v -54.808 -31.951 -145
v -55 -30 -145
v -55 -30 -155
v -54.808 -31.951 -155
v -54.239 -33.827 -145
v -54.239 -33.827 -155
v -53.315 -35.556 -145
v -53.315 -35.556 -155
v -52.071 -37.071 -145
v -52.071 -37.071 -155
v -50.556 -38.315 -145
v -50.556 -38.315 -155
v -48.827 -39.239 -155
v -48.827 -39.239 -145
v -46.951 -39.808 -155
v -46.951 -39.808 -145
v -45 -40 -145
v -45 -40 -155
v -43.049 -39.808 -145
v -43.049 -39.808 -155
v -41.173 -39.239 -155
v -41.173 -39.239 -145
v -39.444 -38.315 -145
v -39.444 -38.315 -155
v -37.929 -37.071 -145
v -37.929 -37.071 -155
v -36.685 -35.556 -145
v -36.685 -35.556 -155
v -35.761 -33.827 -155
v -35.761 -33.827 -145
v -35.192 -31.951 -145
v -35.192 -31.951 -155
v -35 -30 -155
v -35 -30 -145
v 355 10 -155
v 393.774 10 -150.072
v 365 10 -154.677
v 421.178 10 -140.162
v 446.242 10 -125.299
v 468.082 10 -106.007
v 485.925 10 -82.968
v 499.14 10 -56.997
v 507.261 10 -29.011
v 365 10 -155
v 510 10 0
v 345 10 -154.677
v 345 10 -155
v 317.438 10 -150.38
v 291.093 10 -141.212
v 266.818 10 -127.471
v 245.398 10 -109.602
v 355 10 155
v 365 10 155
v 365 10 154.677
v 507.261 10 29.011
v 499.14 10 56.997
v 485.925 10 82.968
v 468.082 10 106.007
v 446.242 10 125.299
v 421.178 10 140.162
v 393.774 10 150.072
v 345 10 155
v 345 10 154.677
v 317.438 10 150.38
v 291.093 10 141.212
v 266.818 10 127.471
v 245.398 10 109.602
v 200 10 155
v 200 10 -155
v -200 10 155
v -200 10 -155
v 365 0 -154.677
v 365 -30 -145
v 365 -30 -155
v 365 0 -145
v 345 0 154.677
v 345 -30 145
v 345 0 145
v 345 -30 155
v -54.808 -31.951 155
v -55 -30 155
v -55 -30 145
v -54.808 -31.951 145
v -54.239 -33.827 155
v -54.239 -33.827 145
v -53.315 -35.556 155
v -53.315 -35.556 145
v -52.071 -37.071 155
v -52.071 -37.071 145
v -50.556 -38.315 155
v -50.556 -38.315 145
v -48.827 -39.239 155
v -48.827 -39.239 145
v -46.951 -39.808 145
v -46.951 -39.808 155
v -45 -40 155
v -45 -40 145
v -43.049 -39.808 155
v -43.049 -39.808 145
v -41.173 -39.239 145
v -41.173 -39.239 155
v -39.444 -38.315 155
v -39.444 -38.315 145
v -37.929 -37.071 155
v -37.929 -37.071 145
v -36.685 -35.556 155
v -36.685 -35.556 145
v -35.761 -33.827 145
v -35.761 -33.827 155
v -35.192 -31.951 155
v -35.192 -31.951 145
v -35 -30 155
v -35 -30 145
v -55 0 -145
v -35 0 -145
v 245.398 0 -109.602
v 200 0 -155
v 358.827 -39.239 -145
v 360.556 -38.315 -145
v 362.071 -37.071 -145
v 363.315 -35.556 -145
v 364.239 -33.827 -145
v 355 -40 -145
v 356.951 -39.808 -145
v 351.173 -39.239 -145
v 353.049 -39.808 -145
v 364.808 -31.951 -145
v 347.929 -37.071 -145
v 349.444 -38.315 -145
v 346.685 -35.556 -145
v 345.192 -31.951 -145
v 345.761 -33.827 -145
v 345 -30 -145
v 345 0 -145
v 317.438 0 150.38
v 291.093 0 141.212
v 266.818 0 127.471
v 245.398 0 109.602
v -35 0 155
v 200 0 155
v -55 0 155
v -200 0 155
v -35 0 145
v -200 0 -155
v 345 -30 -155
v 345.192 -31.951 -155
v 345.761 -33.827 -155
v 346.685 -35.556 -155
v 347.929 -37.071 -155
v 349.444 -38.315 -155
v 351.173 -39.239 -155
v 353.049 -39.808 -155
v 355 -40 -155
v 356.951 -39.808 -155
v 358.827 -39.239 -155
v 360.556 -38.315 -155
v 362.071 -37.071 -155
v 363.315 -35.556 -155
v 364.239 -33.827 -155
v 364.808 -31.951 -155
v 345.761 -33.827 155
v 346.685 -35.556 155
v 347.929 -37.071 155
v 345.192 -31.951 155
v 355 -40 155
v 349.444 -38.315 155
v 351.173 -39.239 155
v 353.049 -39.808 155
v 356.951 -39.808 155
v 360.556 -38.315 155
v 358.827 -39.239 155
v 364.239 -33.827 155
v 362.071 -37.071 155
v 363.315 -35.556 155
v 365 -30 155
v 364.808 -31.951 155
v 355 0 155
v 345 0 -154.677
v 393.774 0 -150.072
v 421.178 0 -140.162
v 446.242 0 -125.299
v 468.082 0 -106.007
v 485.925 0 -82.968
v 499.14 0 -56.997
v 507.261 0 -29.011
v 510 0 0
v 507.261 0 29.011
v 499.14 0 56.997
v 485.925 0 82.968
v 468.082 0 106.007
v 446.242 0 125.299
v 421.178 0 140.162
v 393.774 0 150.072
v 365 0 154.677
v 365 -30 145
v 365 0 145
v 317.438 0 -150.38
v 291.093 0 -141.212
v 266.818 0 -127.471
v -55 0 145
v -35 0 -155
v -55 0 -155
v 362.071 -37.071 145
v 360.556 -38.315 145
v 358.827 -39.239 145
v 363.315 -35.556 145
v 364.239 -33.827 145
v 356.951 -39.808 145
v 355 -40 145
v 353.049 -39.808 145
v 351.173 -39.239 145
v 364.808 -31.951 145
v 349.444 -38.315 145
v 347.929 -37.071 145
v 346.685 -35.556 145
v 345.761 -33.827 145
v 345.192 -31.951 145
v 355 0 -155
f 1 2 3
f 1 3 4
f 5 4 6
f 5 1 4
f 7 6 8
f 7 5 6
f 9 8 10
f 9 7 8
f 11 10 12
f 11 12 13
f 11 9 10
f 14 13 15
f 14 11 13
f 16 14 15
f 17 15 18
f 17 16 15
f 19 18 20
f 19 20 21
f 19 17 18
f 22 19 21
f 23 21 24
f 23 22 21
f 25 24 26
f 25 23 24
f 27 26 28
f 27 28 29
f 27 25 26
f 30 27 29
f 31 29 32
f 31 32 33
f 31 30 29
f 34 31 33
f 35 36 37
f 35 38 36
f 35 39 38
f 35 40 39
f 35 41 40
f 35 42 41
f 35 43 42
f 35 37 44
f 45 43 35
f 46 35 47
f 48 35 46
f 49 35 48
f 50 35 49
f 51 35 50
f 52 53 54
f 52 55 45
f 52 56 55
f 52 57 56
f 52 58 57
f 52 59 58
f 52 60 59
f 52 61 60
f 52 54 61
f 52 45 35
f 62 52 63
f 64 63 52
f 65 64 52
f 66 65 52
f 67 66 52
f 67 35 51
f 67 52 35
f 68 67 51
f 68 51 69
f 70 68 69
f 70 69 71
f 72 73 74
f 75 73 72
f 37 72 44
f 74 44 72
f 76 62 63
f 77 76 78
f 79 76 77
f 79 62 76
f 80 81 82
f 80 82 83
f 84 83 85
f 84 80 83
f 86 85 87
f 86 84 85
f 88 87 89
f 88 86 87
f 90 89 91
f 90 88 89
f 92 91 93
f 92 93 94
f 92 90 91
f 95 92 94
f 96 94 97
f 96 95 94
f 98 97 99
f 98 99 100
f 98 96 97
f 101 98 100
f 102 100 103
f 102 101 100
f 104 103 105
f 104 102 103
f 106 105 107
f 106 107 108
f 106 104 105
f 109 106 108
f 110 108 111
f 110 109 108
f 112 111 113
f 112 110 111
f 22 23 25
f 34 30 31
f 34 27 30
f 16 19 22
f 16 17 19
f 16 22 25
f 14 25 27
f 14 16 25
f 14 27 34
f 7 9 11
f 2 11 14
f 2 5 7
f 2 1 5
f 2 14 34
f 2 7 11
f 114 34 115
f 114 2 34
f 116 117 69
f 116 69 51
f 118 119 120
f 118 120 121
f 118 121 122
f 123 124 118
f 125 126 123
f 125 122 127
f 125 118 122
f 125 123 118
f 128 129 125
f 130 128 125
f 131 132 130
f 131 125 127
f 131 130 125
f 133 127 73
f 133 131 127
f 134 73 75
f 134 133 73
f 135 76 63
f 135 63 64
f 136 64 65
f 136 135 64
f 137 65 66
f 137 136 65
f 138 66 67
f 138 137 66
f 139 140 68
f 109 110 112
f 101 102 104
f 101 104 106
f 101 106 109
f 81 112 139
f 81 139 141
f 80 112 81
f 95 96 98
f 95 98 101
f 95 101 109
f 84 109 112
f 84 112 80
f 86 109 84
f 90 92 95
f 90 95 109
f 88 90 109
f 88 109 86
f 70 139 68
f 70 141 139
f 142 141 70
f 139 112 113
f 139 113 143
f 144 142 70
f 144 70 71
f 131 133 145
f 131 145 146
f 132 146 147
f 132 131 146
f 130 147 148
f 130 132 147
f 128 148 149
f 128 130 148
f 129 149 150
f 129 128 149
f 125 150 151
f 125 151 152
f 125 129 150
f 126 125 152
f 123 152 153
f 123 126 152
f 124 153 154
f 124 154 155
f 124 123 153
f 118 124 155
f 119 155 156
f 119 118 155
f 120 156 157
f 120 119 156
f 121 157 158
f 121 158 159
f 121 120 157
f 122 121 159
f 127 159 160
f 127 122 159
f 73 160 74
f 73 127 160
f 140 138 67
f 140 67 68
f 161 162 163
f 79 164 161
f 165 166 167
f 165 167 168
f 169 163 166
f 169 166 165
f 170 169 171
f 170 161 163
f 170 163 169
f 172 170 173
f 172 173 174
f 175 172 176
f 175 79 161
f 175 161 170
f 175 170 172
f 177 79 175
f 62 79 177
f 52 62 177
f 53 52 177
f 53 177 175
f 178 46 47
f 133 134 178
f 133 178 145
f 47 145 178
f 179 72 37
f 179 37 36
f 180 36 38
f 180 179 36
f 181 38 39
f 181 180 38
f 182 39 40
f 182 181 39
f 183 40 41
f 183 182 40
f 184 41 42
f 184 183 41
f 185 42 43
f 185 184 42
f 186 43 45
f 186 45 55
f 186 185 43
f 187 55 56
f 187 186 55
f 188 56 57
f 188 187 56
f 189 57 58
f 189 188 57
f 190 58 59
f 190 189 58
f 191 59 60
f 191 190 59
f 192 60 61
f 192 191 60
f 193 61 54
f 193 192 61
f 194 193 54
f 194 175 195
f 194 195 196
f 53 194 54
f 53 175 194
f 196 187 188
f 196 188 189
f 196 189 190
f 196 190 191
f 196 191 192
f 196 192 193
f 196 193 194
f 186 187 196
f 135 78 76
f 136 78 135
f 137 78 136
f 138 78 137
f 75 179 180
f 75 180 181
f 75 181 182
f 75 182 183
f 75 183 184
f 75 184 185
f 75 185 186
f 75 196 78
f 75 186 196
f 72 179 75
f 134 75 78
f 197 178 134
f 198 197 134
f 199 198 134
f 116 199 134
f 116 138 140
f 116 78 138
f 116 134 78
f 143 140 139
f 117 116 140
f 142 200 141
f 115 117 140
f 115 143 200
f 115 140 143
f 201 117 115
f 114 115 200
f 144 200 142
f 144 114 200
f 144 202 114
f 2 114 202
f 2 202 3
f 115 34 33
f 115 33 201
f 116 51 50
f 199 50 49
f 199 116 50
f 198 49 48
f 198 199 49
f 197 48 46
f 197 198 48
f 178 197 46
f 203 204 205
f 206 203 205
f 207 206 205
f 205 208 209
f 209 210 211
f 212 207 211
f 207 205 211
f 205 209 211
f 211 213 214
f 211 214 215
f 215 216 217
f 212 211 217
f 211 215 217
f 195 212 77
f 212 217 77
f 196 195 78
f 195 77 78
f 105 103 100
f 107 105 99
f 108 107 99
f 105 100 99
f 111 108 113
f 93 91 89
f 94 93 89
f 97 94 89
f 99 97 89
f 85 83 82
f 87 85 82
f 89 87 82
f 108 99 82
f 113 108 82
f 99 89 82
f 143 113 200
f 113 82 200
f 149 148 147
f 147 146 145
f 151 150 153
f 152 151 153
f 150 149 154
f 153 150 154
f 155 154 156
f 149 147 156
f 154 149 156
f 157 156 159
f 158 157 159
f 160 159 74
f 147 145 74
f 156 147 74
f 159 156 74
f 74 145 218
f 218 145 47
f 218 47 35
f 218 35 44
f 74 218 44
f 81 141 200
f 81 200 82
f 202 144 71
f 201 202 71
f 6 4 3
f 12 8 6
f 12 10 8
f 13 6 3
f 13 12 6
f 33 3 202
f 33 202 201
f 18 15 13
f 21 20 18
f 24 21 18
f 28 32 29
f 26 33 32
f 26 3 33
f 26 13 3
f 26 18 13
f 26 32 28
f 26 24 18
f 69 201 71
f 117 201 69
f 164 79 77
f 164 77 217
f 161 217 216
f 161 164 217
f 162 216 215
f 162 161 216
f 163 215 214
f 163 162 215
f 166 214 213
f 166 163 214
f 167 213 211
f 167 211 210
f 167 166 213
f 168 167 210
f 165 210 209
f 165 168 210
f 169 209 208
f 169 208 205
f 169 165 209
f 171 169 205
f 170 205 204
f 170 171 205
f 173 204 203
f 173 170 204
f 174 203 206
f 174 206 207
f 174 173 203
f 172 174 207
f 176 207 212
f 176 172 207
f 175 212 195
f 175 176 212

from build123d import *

# Parameters (mm, degrees)
BOSS_EXTRUDE2_DEPTH = 10
BOSS_EXTRUDE3_DEPTH = 310
SKETCH7_W           = 290
SKETCH7_H           = 40
CUT_EXTRUDE1_DEPTH  = 589


with BuildPart() as part:
    # Sketch2 → Boss-Extrude2 (new body)
    with BuildSketch(Plane(origin=(0, 0, 0), x_dir=(1, 0, 0), z_dir=(0, 1, 0))):
        with BuildLine():
            Line((200, 155), (245.398448916, 109.601551084))
            ThreePointArc((245.398448916, 109.601551084), (510, 0), (245.398448916, -109.601551084))
            Line((245.398448916, -109.601551084), (200, -155))
            Line((200, -155), (-200, -155))
            Line((-200, -155), (-200, 155))
            Line((-200, 155), (200, 155))
        make_face()
    extrude(amount=BOSS_EXTRUDE2_DEPTH)

    # Sketch6 → Boss-Extrude3 (add)
    with BuildSketch(Plane.XY.offset(155)):
        with BuildLine():
            Line((-35, 10), (-55, 10))
            Line((-55, 10), (-55, -30))
            ThreePointArc((-55, -30), (-45, -40), (-35, -30))
            Line((-35, -30), (-35, 10))
        make_face()
        with BuildLine():
            Line((365, 10), (345, 10))
            Line((345, 10), (345, -30))
            ThreePointArc((345, -30), (355, -40), (365, -30))
            Line((365, -30), (365, 10))
        make_face()
    extrude(amount=-BOSS_EXTRUDE3_DEPTH)

    # Sketch7 → Cut-Extrude1 (cut)
    with BuildSketch(Plane.ZY.offset(55)):
        with Locations((0, -20)):
            Rectangle(SKETCH7_W, SKETCH7_H)
    extrude(amount=-CUT_EXTRUDE1_DEPTH, mode=Mode.SUBTRACT)


solid = part.part
